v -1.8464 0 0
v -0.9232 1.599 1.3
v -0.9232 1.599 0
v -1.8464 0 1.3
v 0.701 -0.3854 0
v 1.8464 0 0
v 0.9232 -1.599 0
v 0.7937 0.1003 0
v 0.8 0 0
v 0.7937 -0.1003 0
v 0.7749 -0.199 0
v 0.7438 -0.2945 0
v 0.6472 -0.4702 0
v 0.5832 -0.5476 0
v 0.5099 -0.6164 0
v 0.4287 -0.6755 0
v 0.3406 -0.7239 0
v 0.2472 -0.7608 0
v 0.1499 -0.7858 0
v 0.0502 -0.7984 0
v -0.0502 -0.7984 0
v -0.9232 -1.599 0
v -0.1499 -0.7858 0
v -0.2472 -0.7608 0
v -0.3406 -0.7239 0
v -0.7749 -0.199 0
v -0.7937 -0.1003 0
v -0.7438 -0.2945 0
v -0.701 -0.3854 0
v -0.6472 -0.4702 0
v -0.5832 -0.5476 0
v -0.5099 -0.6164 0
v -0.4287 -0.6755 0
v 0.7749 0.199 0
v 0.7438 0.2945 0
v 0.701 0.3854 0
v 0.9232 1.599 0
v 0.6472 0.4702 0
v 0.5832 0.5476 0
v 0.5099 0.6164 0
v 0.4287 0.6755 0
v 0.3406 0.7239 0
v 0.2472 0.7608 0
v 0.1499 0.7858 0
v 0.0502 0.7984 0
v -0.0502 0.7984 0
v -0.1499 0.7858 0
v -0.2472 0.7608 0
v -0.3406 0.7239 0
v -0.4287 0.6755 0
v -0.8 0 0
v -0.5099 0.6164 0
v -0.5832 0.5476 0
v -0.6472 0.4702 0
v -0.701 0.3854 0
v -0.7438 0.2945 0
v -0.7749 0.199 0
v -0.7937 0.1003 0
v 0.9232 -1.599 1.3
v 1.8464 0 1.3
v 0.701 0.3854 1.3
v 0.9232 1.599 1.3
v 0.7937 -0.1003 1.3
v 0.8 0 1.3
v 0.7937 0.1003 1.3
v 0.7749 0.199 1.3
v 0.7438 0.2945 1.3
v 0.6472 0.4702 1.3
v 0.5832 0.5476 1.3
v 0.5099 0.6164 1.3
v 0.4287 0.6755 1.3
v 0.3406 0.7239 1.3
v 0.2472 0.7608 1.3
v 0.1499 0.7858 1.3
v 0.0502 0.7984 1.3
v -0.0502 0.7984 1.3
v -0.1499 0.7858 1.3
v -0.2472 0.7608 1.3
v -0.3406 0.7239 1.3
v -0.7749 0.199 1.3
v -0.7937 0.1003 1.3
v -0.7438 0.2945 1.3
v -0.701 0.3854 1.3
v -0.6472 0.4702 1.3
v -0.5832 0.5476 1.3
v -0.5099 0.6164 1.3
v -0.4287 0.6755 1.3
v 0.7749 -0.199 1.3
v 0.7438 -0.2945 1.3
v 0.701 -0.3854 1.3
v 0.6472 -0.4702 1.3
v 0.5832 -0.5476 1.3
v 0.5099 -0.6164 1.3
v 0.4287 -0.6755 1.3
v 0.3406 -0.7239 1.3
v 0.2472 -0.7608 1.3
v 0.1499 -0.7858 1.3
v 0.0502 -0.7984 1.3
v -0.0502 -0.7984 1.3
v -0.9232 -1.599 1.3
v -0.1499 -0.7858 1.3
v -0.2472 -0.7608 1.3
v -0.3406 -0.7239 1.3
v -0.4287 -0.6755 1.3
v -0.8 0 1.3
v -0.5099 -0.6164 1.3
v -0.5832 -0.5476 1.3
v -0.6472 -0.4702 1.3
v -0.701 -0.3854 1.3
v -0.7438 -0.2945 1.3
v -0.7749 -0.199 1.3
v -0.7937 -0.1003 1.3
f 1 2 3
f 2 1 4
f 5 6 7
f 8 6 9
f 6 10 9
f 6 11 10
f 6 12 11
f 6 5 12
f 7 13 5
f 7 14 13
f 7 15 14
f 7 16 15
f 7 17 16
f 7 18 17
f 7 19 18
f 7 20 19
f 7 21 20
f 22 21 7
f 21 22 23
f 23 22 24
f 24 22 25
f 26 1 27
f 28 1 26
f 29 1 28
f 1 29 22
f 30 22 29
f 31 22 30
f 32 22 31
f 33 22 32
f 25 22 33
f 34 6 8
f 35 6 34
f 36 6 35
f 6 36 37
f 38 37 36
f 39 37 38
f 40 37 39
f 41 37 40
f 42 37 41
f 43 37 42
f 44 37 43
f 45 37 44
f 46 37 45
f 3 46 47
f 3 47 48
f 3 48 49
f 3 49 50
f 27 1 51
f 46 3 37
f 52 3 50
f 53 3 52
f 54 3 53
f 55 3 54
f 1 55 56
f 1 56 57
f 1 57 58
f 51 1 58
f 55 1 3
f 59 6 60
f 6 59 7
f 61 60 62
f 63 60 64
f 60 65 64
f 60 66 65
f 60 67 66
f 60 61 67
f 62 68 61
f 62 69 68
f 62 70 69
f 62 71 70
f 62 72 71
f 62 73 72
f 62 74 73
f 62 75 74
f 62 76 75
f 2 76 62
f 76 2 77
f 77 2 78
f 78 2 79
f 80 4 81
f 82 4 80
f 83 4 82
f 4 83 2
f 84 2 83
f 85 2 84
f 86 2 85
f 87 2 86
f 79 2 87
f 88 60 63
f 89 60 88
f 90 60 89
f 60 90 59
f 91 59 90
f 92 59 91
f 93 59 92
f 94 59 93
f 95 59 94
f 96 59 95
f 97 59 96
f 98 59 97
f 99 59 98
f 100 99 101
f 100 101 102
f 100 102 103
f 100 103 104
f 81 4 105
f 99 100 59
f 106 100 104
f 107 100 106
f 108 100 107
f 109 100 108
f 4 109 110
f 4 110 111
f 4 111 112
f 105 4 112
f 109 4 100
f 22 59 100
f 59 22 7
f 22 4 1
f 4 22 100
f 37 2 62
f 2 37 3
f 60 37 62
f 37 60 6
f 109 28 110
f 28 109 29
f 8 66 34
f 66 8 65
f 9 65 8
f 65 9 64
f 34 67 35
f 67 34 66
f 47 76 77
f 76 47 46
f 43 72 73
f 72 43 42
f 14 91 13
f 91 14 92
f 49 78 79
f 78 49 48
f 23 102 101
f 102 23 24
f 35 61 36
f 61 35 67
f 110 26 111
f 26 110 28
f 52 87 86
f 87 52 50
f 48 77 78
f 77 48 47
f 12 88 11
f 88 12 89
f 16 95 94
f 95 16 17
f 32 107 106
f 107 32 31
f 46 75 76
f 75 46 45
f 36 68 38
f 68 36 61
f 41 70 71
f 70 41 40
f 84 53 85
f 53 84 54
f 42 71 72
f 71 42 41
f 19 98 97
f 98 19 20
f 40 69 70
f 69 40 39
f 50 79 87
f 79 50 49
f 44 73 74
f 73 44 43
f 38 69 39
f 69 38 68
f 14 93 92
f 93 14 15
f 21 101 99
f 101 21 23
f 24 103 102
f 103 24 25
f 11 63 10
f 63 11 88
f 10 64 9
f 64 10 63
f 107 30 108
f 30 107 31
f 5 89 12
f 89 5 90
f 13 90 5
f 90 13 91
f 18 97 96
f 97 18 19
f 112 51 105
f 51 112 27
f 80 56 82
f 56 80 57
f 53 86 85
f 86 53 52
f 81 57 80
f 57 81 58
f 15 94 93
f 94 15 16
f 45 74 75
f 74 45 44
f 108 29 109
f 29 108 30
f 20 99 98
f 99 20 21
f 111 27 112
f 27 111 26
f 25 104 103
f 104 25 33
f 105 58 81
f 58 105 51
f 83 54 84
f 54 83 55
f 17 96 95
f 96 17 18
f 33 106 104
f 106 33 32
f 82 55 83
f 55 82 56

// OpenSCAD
$fn = 50;


difference() {
	union() {
		translate(v = [0, 0, 0]) {
			rotate(a = [0, 0, 0]) {
				difference() {
					union() {
						linear_extrude(height = 1.3000000000) {
							polygon(points = [[1.8464000000, 0.0000000000], [0.9232000000, 1.5990293055], [-0.9232000000, 1.5990293055], [-1.8464000000, 0.0000000000], [-0.9232000000, -1.5990293055], [0.9232000000, -1.5990293055]]);
						}
					}
					union();
				}
			}
		}
	}
	union() {
		cylinder(h = 100, r = 0.8000000000);
	}
}
